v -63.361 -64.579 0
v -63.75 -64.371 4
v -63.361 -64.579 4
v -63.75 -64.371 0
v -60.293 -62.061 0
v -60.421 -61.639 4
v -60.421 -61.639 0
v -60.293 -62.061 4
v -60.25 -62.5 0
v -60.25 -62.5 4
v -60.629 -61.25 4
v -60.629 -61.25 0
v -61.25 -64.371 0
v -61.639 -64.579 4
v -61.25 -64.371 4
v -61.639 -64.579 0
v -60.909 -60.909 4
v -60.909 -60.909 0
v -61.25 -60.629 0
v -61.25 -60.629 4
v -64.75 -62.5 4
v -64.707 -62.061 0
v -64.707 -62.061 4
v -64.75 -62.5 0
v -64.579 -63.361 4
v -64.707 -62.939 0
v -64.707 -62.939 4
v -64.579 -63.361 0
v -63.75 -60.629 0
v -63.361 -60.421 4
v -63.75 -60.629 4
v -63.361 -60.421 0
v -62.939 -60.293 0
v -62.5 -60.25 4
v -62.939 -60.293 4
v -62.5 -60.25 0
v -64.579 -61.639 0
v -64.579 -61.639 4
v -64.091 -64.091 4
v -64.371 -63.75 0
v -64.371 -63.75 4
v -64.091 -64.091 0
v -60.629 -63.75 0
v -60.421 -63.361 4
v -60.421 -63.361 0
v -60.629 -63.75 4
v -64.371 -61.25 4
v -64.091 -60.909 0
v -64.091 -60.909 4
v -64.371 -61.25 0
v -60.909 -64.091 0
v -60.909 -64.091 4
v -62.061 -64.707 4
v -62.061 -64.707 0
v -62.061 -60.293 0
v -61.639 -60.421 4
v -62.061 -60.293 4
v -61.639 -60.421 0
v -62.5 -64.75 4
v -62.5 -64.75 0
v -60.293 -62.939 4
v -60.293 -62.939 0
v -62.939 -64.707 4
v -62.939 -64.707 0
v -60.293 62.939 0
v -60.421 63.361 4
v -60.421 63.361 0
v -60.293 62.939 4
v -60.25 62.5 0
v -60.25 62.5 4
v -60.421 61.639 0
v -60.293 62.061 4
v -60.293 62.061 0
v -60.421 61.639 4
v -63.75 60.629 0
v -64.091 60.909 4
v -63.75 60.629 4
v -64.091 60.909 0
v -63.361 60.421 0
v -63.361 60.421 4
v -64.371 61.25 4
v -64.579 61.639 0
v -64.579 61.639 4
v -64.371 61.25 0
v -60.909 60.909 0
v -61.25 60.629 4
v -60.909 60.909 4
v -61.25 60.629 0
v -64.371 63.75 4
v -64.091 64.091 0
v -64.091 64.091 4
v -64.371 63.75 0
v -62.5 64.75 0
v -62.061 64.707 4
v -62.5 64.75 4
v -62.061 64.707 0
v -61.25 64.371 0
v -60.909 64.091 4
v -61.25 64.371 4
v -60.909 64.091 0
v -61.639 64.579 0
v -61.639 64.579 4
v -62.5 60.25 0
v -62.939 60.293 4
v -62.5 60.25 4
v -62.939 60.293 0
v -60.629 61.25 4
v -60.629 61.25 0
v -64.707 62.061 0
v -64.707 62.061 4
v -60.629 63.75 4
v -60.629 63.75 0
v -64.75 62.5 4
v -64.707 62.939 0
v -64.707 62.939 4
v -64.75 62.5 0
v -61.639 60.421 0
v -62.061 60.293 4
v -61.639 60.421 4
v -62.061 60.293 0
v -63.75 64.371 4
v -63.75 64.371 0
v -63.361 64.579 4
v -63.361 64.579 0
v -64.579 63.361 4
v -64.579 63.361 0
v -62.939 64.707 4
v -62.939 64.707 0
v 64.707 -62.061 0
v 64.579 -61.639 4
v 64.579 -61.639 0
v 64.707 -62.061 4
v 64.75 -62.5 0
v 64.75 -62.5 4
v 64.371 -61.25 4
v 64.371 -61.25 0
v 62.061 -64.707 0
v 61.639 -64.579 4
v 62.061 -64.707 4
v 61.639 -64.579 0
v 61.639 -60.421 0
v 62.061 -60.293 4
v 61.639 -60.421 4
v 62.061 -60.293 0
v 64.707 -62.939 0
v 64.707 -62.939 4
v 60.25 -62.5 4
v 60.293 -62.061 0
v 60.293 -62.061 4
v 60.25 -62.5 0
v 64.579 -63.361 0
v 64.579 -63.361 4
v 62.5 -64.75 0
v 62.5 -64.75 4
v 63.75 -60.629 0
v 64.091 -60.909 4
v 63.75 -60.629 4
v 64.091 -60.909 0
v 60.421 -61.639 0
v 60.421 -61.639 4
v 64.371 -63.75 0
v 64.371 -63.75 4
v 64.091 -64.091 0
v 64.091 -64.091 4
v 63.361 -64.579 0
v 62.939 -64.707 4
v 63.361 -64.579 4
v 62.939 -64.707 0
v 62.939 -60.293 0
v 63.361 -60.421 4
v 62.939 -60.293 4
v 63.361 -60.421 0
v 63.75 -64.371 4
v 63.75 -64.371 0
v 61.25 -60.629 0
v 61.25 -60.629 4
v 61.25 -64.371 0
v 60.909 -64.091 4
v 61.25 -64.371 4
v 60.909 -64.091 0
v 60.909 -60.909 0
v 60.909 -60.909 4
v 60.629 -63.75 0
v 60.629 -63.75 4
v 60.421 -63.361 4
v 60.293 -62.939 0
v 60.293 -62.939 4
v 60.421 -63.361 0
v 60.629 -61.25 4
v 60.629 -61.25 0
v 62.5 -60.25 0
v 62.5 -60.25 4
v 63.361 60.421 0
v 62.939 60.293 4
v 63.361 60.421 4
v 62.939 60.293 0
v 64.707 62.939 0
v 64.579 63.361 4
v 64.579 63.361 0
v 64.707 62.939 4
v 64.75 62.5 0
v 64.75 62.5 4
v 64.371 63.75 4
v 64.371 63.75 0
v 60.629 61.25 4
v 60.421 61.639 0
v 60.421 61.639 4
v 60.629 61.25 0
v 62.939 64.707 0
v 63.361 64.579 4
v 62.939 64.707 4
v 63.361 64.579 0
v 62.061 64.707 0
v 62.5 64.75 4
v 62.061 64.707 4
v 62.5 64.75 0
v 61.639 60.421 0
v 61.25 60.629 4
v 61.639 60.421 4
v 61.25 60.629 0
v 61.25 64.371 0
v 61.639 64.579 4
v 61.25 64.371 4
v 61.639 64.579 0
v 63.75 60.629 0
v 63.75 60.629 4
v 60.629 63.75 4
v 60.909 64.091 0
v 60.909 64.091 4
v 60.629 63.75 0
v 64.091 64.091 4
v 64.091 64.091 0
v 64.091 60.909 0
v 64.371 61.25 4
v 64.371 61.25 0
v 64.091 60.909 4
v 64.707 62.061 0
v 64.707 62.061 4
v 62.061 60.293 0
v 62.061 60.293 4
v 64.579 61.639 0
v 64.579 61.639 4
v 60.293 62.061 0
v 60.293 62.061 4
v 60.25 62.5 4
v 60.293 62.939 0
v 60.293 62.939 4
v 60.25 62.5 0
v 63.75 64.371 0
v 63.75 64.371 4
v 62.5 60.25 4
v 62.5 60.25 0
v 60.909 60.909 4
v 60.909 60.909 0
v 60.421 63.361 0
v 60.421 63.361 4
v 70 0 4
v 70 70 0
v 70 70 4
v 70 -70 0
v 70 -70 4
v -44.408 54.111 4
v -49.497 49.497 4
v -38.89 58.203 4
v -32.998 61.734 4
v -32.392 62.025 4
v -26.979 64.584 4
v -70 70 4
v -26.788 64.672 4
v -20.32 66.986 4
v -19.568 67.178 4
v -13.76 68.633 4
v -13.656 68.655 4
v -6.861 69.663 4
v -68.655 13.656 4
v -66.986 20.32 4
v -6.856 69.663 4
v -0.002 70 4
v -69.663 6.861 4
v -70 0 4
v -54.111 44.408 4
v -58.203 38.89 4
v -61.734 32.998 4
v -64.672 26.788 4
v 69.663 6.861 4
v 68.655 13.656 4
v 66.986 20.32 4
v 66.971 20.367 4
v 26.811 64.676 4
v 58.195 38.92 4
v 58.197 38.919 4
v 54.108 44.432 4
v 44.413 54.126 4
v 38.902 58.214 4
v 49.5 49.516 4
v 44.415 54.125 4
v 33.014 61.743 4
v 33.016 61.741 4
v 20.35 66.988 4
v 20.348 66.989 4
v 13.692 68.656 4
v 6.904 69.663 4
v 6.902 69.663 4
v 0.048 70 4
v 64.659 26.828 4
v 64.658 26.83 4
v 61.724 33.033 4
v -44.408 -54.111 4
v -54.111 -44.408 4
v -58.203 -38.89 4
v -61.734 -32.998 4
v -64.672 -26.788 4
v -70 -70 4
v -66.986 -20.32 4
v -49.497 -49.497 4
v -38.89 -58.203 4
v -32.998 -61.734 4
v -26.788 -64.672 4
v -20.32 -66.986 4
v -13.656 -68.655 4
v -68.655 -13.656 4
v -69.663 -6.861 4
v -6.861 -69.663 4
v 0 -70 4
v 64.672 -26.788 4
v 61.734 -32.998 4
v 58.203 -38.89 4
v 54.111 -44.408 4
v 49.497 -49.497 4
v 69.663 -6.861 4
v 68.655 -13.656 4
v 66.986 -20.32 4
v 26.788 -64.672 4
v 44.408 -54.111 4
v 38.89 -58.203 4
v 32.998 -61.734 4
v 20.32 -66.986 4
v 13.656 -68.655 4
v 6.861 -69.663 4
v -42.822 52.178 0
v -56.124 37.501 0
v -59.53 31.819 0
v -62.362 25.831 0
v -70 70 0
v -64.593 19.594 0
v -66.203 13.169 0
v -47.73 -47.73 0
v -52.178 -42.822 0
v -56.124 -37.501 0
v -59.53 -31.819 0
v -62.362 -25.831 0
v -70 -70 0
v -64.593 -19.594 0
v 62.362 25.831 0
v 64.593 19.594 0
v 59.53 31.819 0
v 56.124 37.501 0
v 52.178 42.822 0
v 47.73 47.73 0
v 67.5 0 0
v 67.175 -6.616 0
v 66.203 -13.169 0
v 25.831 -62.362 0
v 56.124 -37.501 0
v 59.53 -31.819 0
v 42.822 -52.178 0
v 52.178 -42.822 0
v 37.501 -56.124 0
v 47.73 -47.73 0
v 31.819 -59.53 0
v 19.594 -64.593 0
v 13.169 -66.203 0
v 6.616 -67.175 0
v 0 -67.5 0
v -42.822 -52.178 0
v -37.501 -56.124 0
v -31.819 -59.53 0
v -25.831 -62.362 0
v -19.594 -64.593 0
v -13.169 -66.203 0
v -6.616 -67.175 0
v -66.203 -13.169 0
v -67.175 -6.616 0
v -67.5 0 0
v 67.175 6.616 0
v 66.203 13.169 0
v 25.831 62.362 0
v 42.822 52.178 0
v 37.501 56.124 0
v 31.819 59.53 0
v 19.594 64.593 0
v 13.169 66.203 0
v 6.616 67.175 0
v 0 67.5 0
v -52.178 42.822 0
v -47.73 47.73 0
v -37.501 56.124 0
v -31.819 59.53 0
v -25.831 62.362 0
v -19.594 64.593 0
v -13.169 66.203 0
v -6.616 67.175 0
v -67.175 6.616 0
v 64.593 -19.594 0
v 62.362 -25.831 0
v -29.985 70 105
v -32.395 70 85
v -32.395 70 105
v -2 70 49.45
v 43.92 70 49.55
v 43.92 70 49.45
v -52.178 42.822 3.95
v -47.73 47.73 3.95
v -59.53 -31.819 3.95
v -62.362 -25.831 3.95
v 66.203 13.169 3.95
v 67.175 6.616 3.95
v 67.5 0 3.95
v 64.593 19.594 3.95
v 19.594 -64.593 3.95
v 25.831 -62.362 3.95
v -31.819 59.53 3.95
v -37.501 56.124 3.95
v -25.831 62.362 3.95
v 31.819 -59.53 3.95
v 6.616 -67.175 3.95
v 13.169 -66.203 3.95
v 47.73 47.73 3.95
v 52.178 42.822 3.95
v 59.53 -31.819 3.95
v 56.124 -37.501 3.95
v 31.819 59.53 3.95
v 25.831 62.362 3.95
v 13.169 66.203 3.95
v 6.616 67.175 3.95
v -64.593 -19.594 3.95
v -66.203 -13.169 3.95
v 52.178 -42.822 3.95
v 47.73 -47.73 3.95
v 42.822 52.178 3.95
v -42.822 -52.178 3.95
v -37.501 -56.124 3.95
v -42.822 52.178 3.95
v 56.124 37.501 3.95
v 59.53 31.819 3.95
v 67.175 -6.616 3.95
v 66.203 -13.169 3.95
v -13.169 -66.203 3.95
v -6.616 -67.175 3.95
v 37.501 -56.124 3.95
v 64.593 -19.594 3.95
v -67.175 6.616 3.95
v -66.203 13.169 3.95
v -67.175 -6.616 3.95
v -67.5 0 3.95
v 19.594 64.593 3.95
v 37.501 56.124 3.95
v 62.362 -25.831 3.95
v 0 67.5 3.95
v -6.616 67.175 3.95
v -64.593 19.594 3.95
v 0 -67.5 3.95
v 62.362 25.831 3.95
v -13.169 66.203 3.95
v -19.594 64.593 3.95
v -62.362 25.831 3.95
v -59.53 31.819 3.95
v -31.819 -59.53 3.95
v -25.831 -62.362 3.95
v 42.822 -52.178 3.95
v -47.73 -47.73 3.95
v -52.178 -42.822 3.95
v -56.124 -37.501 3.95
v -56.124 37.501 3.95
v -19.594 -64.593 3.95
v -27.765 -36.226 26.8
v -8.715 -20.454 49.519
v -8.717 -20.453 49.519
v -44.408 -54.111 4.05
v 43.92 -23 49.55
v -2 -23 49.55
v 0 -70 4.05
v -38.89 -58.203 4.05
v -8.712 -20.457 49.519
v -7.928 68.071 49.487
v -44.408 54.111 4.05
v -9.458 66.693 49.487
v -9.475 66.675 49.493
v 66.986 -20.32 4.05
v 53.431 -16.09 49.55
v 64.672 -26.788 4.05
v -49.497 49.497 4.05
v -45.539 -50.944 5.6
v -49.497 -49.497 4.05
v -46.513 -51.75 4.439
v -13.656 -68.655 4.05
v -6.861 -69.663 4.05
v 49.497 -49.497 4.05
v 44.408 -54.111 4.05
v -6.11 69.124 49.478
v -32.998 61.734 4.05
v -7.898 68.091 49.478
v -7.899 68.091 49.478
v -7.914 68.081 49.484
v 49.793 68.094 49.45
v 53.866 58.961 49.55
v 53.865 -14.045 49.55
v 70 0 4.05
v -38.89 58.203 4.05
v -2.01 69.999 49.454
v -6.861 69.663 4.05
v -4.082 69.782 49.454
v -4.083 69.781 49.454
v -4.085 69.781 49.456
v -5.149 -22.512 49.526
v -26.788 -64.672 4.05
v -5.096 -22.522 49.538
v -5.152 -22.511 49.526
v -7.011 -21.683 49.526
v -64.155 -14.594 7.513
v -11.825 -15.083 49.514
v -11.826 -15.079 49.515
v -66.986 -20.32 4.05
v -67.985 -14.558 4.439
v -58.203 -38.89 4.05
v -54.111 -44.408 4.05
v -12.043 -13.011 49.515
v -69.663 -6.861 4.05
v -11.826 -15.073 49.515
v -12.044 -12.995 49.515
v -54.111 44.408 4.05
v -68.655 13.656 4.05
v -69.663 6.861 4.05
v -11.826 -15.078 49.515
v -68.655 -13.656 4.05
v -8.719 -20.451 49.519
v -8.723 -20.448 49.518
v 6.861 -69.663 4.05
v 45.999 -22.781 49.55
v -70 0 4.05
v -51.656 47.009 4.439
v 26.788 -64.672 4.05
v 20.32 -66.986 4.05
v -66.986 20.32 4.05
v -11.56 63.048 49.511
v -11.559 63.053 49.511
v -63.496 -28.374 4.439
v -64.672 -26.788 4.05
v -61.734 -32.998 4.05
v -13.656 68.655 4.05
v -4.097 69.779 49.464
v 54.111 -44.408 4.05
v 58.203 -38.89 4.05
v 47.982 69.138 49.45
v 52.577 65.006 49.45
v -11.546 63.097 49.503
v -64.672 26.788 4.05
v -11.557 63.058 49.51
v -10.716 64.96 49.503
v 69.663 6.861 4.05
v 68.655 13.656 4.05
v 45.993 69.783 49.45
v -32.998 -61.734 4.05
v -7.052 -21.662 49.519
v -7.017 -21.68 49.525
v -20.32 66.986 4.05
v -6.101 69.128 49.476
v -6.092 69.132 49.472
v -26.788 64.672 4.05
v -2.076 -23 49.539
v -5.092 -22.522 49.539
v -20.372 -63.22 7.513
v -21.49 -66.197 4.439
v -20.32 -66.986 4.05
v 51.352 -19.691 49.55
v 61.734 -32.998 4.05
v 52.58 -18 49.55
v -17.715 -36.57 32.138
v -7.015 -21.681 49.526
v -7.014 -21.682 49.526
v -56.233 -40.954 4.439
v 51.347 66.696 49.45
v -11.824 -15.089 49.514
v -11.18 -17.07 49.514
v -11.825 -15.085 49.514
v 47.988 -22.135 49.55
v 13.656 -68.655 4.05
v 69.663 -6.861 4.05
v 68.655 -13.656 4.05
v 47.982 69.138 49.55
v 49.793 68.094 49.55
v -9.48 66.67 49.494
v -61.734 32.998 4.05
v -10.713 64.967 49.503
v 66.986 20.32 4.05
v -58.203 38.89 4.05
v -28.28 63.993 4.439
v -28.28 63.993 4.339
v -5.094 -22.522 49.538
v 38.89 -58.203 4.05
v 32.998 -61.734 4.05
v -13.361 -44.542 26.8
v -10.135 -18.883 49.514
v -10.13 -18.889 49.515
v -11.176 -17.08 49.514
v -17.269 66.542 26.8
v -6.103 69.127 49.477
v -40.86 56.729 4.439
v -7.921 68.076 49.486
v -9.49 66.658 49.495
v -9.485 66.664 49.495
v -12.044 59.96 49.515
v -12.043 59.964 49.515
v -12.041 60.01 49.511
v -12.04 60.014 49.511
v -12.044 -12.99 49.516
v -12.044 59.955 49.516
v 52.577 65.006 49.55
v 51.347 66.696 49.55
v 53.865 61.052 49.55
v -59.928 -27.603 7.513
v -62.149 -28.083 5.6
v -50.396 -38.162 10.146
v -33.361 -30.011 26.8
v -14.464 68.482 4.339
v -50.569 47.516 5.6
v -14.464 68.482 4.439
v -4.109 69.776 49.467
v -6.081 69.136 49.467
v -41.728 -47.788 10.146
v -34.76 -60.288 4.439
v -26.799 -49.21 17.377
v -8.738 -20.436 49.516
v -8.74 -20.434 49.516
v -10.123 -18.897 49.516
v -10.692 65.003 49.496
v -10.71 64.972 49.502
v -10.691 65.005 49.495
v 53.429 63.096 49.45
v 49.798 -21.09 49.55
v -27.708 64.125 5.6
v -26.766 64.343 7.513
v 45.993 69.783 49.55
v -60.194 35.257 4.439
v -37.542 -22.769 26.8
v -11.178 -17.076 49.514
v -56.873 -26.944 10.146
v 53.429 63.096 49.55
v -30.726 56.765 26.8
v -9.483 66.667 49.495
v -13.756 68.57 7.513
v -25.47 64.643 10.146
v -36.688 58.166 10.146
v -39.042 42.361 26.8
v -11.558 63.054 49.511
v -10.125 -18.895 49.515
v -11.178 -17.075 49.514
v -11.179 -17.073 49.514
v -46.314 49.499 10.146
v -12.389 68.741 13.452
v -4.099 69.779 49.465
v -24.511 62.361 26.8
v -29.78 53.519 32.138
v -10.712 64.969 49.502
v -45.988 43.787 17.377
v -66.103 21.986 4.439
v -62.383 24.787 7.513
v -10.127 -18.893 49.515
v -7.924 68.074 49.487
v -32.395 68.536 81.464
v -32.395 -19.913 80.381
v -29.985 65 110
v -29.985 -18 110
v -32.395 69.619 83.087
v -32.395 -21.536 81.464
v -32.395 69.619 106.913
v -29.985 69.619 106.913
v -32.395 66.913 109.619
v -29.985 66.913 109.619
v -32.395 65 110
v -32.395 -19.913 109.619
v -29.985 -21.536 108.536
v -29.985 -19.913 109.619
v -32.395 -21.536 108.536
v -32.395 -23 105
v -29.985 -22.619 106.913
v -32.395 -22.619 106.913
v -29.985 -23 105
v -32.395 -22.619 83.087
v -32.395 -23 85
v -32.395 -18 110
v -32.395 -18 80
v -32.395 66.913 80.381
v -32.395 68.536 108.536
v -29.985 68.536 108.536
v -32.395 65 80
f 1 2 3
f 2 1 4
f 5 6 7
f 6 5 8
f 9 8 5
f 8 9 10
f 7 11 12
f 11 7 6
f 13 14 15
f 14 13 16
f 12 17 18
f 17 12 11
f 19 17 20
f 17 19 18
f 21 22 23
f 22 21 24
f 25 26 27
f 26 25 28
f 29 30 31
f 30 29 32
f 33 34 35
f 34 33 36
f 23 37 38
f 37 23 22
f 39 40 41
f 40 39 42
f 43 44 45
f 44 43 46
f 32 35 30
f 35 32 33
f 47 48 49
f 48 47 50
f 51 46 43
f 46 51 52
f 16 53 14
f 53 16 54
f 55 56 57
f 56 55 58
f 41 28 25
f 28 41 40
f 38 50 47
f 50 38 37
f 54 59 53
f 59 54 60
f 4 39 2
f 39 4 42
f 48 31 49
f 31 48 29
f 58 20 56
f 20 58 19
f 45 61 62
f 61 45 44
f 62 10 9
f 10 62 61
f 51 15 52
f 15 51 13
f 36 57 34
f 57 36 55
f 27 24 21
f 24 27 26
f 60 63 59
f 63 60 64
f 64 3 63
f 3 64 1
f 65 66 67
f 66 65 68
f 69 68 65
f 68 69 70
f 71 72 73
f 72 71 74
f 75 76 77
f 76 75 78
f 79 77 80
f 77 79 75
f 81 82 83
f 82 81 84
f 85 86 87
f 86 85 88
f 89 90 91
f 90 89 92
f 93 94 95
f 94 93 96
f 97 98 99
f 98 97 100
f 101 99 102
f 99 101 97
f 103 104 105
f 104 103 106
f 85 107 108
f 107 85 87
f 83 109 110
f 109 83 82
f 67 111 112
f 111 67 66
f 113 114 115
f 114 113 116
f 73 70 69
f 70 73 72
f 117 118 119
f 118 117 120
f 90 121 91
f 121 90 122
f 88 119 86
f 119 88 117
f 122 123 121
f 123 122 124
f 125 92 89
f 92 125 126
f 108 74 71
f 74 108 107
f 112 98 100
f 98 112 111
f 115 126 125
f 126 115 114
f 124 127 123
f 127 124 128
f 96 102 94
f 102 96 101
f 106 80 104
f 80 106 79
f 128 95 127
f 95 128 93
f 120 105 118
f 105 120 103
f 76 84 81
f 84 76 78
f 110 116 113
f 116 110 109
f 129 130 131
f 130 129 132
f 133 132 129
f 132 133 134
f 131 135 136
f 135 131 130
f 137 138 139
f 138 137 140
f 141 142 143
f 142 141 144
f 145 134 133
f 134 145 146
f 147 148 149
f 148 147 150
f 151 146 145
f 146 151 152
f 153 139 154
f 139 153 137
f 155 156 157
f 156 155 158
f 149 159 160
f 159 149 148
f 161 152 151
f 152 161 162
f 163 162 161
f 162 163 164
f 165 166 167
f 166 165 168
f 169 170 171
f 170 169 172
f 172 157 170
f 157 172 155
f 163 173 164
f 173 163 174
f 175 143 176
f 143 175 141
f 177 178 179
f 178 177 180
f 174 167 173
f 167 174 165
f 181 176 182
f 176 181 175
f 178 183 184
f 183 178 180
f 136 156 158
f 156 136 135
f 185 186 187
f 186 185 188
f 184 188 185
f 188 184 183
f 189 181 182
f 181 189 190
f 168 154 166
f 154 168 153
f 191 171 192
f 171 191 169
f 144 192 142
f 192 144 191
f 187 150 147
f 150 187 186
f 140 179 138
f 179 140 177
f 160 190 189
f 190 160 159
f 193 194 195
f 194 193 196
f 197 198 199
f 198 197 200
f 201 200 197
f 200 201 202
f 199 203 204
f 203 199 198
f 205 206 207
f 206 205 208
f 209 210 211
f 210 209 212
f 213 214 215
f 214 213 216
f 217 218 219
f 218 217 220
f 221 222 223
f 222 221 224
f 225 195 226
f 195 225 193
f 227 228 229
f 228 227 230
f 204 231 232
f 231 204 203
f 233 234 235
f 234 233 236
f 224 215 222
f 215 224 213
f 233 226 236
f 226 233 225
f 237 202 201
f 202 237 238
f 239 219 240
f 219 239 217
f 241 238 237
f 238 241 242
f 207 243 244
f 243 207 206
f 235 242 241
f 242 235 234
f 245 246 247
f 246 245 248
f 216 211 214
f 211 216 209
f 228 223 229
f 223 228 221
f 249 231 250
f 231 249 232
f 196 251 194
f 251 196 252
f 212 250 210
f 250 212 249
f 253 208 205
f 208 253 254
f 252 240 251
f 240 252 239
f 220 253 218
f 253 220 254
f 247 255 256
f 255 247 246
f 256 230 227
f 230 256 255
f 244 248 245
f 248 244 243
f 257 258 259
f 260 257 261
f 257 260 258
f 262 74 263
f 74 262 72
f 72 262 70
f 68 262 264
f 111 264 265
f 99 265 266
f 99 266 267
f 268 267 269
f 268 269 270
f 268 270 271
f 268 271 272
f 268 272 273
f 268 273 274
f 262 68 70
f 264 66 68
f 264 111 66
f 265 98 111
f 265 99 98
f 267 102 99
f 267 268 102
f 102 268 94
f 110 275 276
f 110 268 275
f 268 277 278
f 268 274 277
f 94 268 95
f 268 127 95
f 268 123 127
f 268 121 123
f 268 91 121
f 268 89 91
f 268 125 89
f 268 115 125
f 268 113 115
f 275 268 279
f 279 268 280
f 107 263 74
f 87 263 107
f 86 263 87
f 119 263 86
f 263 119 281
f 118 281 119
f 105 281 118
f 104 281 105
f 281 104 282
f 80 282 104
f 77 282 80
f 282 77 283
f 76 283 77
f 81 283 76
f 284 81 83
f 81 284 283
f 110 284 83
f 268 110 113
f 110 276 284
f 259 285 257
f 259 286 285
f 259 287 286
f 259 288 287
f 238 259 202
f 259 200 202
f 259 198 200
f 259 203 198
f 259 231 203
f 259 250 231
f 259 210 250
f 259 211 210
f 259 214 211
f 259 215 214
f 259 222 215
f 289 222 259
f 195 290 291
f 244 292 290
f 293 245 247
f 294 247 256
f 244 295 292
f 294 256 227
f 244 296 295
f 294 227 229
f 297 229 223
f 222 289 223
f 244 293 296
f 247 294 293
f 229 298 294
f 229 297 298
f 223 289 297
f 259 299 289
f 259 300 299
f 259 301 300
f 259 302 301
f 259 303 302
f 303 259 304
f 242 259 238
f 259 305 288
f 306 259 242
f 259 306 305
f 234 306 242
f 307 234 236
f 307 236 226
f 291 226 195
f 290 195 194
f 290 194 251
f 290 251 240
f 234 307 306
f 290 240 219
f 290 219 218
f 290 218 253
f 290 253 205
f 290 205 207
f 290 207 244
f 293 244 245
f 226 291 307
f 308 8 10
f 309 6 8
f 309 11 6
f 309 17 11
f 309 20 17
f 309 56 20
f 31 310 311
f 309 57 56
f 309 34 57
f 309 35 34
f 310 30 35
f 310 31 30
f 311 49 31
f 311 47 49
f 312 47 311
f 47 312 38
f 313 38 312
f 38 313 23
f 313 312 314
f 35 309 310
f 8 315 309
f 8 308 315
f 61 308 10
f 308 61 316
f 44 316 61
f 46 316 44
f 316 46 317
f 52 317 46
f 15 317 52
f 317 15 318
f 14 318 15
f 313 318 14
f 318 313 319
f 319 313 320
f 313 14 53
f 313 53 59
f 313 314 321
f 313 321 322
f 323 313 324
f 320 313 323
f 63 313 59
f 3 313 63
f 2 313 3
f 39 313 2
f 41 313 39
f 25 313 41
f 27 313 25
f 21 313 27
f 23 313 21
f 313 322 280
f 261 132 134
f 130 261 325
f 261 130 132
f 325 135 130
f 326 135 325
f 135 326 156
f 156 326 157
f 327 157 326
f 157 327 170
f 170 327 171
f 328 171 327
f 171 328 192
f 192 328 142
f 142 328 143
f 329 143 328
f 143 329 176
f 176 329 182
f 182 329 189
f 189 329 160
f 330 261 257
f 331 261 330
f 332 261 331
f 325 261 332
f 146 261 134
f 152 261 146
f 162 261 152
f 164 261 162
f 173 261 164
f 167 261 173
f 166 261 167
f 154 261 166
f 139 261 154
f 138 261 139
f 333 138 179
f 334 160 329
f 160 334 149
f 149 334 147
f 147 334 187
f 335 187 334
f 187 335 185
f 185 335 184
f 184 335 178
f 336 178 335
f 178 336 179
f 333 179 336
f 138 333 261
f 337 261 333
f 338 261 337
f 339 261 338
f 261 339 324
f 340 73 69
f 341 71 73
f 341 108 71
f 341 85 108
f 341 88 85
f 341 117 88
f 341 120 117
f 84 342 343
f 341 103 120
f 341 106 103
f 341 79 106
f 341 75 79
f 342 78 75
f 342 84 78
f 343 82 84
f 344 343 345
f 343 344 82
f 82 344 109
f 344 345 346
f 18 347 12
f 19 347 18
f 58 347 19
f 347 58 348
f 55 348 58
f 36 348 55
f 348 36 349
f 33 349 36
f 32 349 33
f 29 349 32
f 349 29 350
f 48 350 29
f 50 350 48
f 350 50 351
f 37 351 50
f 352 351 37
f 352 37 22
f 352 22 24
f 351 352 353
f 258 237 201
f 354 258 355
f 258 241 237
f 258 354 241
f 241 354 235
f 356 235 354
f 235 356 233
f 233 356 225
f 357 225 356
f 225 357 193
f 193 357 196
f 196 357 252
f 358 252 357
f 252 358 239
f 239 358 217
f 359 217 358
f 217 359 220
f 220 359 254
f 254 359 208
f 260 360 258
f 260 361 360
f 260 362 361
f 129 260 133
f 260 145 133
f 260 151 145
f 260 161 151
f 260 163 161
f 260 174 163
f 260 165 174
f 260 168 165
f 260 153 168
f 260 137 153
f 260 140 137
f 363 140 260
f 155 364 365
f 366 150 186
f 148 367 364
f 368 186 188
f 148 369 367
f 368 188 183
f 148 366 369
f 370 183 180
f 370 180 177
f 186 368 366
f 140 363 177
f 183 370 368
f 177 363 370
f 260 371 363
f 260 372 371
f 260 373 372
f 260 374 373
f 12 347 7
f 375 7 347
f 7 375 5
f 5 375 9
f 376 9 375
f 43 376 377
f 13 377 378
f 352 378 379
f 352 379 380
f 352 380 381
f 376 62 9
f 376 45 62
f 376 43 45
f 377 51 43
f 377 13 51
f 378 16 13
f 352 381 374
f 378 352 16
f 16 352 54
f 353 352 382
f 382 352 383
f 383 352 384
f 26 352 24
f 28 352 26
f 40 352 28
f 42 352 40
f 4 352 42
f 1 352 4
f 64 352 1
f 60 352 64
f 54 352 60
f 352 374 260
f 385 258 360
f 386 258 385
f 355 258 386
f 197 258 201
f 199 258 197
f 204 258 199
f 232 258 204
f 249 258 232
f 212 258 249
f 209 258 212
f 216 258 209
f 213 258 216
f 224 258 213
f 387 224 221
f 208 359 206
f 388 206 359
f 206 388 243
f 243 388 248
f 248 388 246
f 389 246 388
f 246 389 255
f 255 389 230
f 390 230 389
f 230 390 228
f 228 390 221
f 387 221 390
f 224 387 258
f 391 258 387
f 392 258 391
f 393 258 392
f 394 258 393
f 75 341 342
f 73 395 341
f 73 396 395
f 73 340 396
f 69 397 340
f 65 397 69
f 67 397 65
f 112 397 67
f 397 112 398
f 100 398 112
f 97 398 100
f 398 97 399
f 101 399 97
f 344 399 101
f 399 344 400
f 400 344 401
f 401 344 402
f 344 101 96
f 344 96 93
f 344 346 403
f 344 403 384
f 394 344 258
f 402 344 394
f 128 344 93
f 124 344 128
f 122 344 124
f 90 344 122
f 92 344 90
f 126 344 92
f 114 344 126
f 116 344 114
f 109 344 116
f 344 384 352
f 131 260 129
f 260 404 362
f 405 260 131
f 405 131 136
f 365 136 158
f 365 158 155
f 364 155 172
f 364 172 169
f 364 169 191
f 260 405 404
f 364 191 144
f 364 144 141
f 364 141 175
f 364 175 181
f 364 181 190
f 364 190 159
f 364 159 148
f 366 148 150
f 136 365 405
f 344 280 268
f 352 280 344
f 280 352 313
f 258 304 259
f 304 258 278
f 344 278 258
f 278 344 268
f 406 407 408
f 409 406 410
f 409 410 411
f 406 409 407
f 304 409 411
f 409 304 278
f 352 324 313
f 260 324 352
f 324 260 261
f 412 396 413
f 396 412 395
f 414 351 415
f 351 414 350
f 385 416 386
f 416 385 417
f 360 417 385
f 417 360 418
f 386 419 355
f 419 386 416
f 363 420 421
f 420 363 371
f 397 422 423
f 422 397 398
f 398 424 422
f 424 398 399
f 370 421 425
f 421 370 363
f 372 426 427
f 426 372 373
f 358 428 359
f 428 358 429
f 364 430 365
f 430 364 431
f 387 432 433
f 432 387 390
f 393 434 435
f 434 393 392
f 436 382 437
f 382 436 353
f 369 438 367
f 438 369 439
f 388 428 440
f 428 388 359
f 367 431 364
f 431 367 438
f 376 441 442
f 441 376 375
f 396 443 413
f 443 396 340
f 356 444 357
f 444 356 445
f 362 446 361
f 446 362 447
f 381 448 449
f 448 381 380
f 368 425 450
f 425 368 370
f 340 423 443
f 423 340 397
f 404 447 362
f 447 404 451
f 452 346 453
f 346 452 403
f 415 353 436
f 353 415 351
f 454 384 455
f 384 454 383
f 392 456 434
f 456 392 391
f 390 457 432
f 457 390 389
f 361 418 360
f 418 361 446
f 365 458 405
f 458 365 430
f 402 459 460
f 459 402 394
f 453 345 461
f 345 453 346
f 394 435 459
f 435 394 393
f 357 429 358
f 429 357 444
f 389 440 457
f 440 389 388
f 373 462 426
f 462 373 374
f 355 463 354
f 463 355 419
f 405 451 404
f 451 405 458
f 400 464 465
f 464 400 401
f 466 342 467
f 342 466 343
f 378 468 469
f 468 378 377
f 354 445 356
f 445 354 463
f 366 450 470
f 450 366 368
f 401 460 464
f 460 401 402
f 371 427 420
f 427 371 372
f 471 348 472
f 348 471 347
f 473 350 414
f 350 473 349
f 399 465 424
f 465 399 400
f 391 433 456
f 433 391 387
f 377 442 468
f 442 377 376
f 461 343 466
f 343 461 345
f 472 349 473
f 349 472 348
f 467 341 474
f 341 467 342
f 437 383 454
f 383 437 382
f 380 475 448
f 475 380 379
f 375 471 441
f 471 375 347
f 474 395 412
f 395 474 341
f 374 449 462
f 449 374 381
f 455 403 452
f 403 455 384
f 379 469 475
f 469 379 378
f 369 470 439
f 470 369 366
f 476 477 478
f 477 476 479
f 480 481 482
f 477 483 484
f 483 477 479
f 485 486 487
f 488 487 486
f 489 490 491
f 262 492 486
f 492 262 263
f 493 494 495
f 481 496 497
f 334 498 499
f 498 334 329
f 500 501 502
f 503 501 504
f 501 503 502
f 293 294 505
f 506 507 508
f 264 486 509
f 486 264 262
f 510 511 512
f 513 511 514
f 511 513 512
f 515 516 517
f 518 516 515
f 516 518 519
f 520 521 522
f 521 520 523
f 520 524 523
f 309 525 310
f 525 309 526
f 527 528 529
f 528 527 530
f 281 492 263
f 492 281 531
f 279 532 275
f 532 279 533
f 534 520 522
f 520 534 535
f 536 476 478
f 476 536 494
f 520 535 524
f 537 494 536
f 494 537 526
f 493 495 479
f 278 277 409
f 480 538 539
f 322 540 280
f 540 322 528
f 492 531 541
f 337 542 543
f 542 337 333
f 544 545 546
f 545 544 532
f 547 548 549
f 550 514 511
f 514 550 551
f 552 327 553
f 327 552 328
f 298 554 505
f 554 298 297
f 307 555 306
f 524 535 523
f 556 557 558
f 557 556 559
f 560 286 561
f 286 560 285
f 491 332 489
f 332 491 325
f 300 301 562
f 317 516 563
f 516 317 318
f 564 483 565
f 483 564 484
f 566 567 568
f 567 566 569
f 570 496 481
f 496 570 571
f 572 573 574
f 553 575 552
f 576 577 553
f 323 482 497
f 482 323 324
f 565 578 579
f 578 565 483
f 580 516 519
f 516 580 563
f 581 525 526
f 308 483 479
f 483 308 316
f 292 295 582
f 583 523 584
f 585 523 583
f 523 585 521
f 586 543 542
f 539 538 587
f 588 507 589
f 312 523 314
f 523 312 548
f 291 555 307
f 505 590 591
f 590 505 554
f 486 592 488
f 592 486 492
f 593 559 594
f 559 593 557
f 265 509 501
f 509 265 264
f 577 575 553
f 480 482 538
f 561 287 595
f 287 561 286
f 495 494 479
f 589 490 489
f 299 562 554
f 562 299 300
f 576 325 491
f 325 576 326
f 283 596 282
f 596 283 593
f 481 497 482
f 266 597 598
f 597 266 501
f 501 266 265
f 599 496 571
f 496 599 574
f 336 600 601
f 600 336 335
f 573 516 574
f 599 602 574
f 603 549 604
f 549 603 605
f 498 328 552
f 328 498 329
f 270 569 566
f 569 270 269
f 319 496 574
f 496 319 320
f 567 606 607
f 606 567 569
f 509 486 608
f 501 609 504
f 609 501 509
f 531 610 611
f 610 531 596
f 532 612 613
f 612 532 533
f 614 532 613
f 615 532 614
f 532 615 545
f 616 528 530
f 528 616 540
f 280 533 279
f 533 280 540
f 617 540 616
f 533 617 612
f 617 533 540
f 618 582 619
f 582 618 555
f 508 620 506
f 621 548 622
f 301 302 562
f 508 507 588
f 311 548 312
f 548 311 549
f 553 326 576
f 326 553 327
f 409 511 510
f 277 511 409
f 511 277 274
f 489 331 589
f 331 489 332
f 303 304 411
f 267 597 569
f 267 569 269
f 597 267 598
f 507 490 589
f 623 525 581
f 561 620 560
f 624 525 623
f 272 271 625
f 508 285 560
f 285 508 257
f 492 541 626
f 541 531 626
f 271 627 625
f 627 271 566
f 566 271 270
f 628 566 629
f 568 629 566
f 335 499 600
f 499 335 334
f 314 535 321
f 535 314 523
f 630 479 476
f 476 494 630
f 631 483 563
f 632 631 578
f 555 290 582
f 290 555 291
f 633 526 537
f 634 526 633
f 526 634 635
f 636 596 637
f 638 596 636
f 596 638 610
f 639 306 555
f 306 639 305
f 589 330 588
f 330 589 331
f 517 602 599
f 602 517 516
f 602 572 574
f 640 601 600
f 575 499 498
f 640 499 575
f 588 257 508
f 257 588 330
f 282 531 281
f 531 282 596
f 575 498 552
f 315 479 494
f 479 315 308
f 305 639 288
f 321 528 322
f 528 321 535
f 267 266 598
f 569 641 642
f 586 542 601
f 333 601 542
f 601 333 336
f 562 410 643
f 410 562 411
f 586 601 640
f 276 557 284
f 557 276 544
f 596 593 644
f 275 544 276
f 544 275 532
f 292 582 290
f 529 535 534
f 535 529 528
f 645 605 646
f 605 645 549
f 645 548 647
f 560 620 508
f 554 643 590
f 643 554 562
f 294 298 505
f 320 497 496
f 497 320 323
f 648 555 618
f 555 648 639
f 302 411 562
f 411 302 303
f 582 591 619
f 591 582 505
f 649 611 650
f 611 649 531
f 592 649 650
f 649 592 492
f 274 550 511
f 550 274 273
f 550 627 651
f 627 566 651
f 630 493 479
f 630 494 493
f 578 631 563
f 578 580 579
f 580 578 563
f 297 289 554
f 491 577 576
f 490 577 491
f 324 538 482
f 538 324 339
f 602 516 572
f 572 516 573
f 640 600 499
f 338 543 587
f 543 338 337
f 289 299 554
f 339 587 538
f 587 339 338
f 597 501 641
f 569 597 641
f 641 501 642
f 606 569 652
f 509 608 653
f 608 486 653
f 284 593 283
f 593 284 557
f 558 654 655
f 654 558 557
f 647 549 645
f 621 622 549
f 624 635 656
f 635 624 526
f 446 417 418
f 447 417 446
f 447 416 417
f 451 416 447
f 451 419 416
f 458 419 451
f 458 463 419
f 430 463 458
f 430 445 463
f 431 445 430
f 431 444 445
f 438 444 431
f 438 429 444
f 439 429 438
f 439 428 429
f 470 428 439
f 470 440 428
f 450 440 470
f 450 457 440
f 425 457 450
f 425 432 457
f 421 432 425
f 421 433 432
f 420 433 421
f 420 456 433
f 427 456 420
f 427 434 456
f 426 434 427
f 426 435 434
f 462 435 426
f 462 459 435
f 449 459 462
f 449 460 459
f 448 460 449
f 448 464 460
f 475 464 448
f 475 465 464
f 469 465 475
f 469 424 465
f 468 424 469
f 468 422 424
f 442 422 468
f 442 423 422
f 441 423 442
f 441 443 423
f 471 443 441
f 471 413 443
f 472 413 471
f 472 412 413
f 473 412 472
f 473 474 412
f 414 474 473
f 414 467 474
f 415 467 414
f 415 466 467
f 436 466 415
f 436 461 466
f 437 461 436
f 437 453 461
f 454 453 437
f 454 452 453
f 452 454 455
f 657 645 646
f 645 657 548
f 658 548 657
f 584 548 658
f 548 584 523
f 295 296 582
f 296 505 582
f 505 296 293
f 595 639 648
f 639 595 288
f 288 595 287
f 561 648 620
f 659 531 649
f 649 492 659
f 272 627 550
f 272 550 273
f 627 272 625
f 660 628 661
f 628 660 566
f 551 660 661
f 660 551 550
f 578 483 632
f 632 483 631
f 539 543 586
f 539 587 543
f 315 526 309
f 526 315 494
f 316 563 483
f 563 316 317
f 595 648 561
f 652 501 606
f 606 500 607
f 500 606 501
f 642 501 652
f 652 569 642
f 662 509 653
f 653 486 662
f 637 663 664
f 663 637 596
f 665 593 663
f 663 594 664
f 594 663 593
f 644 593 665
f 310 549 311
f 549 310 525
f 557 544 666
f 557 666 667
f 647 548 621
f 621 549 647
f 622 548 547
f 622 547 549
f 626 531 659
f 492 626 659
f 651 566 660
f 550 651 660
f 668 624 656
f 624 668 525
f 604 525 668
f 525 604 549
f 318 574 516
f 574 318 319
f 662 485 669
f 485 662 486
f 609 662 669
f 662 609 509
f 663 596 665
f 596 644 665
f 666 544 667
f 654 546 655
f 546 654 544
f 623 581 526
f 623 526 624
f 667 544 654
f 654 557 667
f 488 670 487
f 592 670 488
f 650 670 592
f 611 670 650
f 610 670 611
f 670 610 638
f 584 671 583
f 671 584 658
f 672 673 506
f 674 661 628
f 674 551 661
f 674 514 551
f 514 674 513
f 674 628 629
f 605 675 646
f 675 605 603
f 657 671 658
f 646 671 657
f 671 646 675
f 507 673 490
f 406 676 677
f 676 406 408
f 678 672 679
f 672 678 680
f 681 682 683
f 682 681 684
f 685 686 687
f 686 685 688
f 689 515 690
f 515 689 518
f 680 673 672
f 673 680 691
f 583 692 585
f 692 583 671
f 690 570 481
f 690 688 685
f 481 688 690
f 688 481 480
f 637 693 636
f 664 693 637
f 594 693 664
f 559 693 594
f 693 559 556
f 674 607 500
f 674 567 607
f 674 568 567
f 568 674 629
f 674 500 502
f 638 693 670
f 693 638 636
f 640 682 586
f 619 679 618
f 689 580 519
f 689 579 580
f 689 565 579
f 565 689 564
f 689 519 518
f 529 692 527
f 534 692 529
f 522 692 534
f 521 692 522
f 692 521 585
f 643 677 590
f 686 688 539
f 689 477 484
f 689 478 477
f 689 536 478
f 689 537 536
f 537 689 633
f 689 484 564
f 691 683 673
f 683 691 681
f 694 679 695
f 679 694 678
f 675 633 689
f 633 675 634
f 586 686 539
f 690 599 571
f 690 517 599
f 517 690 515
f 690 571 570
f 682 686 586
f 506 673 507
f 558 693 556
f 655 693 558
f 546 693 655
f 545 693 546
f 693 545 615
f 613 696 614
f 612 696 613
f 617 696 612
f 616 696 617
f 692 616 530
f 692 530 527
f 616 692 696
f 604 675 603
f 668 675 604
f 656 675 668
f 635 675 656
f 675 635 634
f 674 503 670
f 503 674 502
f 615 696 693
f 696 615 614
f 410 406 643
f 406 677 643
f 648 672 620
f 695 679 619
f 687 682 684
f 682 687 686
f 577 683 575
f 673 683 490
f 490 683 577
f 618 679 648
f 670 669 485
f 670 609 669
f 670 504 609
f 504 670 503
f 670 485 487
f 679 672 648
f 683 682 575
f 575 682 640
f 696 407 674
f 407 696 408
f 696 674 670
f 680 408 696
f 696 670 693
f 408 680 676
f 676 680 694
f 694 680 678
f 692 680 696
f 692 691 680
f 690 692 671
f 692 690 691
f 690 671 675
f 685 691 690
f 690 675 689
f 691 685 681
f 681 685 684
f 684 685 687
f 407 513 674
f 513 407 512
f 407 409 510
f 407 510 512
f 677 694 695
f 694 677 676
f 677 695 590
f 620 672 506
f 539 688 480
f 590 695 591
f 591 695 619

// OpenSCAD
// Clean build approach - starting with basic components
//
// === INVARIANT: X, Y, Z coordinate system is INVARIANT throughout script ===
// See DESIGN_CANONS.md for full constraints
// - All dimensions use *_x_dimension, *_y_dimension, *_z_dimension naming
// - Base bottom at Z=0, all geometry at Z >= 0
//

// === CONSTANTS ===
overlap = 0.01;  // Small overlap for 3D printing geometry fusion (reused throughout)

// === BASE PARAMETERS ===
// Standard 140mm fan mounting
fan_xy_dimension = 140;      // Square base, same for X and Y axes
base_z_dimension = 4;         // Dimension along Z axis (plate thickness)
mounting_hole_spacing = 125;  // Center-to-center distance between holes (X and Y)
mounting_hole_diameter = 4.5; // Diameter for M4 screws with clearance
intake_diameter = 135;        // Circular intake opening diameter

// === DUCT SHELL PARAMETERS ===
shell_base_radius = 70;  // intake_diameter/2 + 2.5mm rim = 67.5 + 2.5

// === EGRESS PARAMETERS ===
// Final exit opening dimensions (in WORLD coordinates after rotation)
egress_x_dimension = 2.4;  // Dimension along X axis (wall thickness)
egress_y_dimension = 93;   // Dimension along Y axis (height)
egress_z_dimension = 30;   // Dimension along Z axis (width)
egress_fillet_radius = 5;  // Corner fillet radius for smooth airflow

// === INTERMEDIATE PARAMETERS ===
intermediate_x_dimension = egress_z_dimension;
intermediate_y_dimension = egress_y_dimension;
intermediate_z_dimension = 0.1;
intermediate_x_scale_center = 2.0;  // Scale factor at Y center (coefficient)
intermediate_x_scale_edges = 1.0;   // Scale factor at Y edges

// Egress position (center point)
egress_x = -30;      // Left offset from center
egress_y = (fan_xy_dimension - egress_y_dimension) / 2;  // Y offset to align one edge with base edge (93mm)
egress_z = 95;       // Height above bottom of base

// === HULL DISTRIBUTION PARAMETERS ===
// First hull: base to intermediate
base_hull_profile_count = 11;        // Number of intermediate profiles in first hull segment
base_hull_spacing_factor = 1.0;      // Cosine acceleration factor (>1.0 = more aggressive)
base_fillet_radius = 70;             // Fillet radius at base (circular)
terminus_fillet_radius = 10;         // Fillet radius at intermediate terminus
terminus_left_extension_factor = 0.20;  // Left edge extension as fraction of terminus max X dimension
terminus_y_offset = 23.5;            // Y-axis offset at terminus (aligns high-Y edge with base edge at Y=70mm)

// Second hull: intermediate to egress
egress_hull_profile_count = 11;      // Number of intermediate profiles in second hull segment
egress_hull_spacing_factor = 1.0;    // Cosine acceleration factor (>1.0 = more aggressive, higher frequency at bottom)
egress_rotation_accel_factor = 1.2;  // Rotation acceleration factor (1.0 = standard, >1.0 = more acceleration)

// Egress orientation (perpendicular to base = rotated 90° around Y axis)
egress_rotation = 90;  // Degrees around Y axis

// === VISUALIZATION ===
// Set to true to show reference axes and dimensions
show_guides = false;

// === COMPONENTS ===

// Base mounting plate (bottom at z=0)
module base_plate() {
    color("lightblue")
    difference() {
        translate([0, 0, base_z_dimension/2])
            cube([fan_xy_dimension, fan_xy_dimension, base_z_dimension], center=true);

        // Circular intake opening
        translate([0, 0, 0])
            cylinder(d=intake_diameter, h=base_z_dimension*3, center=true, $fn=64);

        // Mounting screw holes at four corners
        mounting_holes();
    }
}

// Four mounting holes in standard 140mm fan pattern
module mounting_holes() {
    half_spacing = mounting_hole_spacing / 2;
    for (x = [-1, 1], y = [-1, 1]) {
        translate([x * half_spacing, y * half_spacing, 0])
            cylinder(d=mounting_hole_diameter, h=base_z_dimension*3, center=true, $fn=32);
    }
}

// Solid duct shell base (circular) - slight overlap with base for 3D printing
module shell_base() {
    color("orange", 0.7)
    translate([0, 0, base_z_dimension - overlap])
        cylinder(r=shell_base_radius, h=0.1, $fn=64);
}

// Intermediate rectangular profile - horizontal, guides transition (cosine curve along Y)
module shell_intermediate() {
    intermediate_z = (base_z_dimension + egress_z) / 2;

    color("purple", 0.7)
    translate([0, 0, intermediate_z])
        linear_extrude(height=intermediate_z_dimension, center=true) {
            // Create profile with cosine-based X variation along Y
            steps = 20;
            polygon(concat(
                // Right edge with cosine curve
                [for (i = [0:steps])
                    let(
                        y = -intermediate_y_dimension/2 + i * intermediate_y_dimension/steps,
                        t = i / steps,
                        curve = (1 - cos((t - 0.5) * 360)) / 2,
                        scale = intermediate_x_scale_edges + (intermediate_x_scale_center - intermediate_x_scale_edges) * curve,
                        x = intermediate_x_dimension * scale
                    )
                    [x, y]
                ],
                [for (i = [steps:-1:0]) [0, -intermediate_y_dimension/2 + i * intermediate_y_dimension/steps]]
            ));
        }
}

// Morphing profile: base (circular) to intermediate (rounded rectangle with cosine curve)
// progress: 0 = base position/shape, 1 = intermediate position/shape
module shell_base_to_intermediate_profile(progress) {
    // Calculate eased progress (accelerating distribution toward terminus)
    eased = 1 - cos(progress * 90 * base_hull_spacing_factor);

    // Calculate Z position
    intermediate_z = (base_z_dimension + egress_z) / 2;
    z = base_z_dimension + (intermediate_z - base_z_dimension) * eased;

    // Calculate Y offset (morphs from 0 at base to terminus_y_offset at terminus)
    y_offset = terminus_y_offset * eased;

    // Calculate morphing fillet radius
    fillet = base_fillet_radius - (base_fillet_radius - terminus_fillet_radius) * eased;

    // Morph Y dimension
    y_dim = shell_base_radius * 2 + (intermediate_y_dimension - shell_base_radius * 2) * eased;

    // Calculate left edge extension at terminus
    terminus_max_x = intermediate_x_dimension * intermediate_x_scale_center;  // 30 * 2.0 = 60mm
    left_extension = terminus_max_x * terminus_left_extension_factor;  // 60 * 0.33 = 20mm

    color("purple", 0.7)
    translate([0, y_offset, z])
        linear_extrude(height=intermediate_z_dimension, center=true) {
            if (progress == 0) {
                // At base: circular
                circle(r=base_fillet_radius, $fn=64);
            } else {
                // Morphing to rectangular with cosine curve
                offset(r=fillet)
                offset(r=-fillet) {
                    steps = 20;
                    polygon(concat(
                        // Right edge with cosine curve morphing
                        [for (i = [0:steps])
                            let(
                                y = -y_dim/2 + i * y_dim/steps,
                                t = i / steps,
                                curve = (1 - cos((t - 0.5) * 360)) / 2,
                                // At base: scale=1 (circular), at terminus: cosine curve scale
                                scale = 1 + (intermediate_x_scale_center - 1) * curve * eased,
                                // Morph from +70mm (base) to cosine-scaled width (terminus)
                                x = shell_base_radius * (1 - eased) + intermediate_x_dimension * scale * eased
                            )
                            [x, y]
                        ],
                        // Left edge morphing from -70mm to -left_extension
                        [for (i = [steps:-1:0])
                            let(
                                y = -y_dim/2 + i * y_dim/steps,
                                x = -shell_base_radius * (1 - eased) - left_extension * eased
                            )
                            [x, y]
                        ]
                    ));
                }
            }
        }
}

// Hull segment: base to intermediate (with all intermediate profiles)
module hull_base_to_intermediate() {
    color("orange", 0.7)
    hull() {
        // Generate all profiles from base (progress=0) to intermediate (progress=1)
        // Total profiles = base_hull_profile_count + 2 (base and terminus)
        for (i = [0 : base_hull_profile_count + 1]) {
            progress = i / (base_hull_profile_count + 1);
            shell_base_to_intermediate_profile(progress);
        }
    }
}

// Hull segment: intermediate to egress (direct hull, no intermediates)
module hull_intermediate_to_egress() {
    color("orange", 0.7)
    hull() {
        shell_base_to_intermediate_profile(1);  // Midpoint terminus (fixed)
        shell_egress();                          // Egress target (fixed)
    }
}

// Solid egress end piece (rounded rectangle) - positioned at outer surface of egress frame (closest to Z axis)
module shell_egress() {
    color("orange", 0.7)
    // Position at outer surface (closest to Z axis/base) with overlap
    translate([egress_x - egress_x_dimension/2 + overlap, egress_y, egress_z])
        rotate([0, egress_rotation, 0])
        linear_extrude(height=egress_x_dimension + overlap, center=true) {
            // Rounded rectangle using offset
            offset(r=egress_fillet_radius)
            offset(r=-egress_fillet_radius)
            square([egress_z_dimension, egress_y_dimension], center=true);
        }
}

// Complete solid shell - union of hull segments
module shell_solid() {
    union() {
        hull_base_to_intermediate();
        hull_intermediate_to_egress();
    }
}

// Egress opening frame (hollow rectangle)
module egress_frame() {
    color("yellow")
    translate([egress_x, egress_y, egress_z])
        rotate([0, egress_rotation, 0])
        linear_extrude(height=egress_x_dimension, center=true)
        difference() {
            square([egress_z_dimension, egress_y_dimension], center=true);
            // Inner opening slightly smaller
            square([egress_z_dimension - egress_x_dimension*2,
                    egress_y_dimension - egress_x_dimension*2], center=true);
        }
}

// Guide markers (optional visualization)
module guides() {
    if (show_guides) {
        // Base center marker
        color("red") cylinder(d=5, h=1, center=true);

        // Egress center marker
        color("green")
        translate([egress_x, egress_y, egress_z])
            sphere(d=10);

        // Connection line
        color("blue", 0.3)
        hull() {
            cylinder(d=2, h=0.1, center=true);
            translate([egress_x, egress_y, egress_z])
                sphere(d=2);
        }
    }
}

// === ASSEMBLY ===
base_plate();
shell_solid();
guides();

// === NOTES ===
// Next steps to build:
// 1. Add intake circular opening to base
// 2. Add duct shell connecting base to egress
// 3. Add inner void
// 4. Add mounting holes
